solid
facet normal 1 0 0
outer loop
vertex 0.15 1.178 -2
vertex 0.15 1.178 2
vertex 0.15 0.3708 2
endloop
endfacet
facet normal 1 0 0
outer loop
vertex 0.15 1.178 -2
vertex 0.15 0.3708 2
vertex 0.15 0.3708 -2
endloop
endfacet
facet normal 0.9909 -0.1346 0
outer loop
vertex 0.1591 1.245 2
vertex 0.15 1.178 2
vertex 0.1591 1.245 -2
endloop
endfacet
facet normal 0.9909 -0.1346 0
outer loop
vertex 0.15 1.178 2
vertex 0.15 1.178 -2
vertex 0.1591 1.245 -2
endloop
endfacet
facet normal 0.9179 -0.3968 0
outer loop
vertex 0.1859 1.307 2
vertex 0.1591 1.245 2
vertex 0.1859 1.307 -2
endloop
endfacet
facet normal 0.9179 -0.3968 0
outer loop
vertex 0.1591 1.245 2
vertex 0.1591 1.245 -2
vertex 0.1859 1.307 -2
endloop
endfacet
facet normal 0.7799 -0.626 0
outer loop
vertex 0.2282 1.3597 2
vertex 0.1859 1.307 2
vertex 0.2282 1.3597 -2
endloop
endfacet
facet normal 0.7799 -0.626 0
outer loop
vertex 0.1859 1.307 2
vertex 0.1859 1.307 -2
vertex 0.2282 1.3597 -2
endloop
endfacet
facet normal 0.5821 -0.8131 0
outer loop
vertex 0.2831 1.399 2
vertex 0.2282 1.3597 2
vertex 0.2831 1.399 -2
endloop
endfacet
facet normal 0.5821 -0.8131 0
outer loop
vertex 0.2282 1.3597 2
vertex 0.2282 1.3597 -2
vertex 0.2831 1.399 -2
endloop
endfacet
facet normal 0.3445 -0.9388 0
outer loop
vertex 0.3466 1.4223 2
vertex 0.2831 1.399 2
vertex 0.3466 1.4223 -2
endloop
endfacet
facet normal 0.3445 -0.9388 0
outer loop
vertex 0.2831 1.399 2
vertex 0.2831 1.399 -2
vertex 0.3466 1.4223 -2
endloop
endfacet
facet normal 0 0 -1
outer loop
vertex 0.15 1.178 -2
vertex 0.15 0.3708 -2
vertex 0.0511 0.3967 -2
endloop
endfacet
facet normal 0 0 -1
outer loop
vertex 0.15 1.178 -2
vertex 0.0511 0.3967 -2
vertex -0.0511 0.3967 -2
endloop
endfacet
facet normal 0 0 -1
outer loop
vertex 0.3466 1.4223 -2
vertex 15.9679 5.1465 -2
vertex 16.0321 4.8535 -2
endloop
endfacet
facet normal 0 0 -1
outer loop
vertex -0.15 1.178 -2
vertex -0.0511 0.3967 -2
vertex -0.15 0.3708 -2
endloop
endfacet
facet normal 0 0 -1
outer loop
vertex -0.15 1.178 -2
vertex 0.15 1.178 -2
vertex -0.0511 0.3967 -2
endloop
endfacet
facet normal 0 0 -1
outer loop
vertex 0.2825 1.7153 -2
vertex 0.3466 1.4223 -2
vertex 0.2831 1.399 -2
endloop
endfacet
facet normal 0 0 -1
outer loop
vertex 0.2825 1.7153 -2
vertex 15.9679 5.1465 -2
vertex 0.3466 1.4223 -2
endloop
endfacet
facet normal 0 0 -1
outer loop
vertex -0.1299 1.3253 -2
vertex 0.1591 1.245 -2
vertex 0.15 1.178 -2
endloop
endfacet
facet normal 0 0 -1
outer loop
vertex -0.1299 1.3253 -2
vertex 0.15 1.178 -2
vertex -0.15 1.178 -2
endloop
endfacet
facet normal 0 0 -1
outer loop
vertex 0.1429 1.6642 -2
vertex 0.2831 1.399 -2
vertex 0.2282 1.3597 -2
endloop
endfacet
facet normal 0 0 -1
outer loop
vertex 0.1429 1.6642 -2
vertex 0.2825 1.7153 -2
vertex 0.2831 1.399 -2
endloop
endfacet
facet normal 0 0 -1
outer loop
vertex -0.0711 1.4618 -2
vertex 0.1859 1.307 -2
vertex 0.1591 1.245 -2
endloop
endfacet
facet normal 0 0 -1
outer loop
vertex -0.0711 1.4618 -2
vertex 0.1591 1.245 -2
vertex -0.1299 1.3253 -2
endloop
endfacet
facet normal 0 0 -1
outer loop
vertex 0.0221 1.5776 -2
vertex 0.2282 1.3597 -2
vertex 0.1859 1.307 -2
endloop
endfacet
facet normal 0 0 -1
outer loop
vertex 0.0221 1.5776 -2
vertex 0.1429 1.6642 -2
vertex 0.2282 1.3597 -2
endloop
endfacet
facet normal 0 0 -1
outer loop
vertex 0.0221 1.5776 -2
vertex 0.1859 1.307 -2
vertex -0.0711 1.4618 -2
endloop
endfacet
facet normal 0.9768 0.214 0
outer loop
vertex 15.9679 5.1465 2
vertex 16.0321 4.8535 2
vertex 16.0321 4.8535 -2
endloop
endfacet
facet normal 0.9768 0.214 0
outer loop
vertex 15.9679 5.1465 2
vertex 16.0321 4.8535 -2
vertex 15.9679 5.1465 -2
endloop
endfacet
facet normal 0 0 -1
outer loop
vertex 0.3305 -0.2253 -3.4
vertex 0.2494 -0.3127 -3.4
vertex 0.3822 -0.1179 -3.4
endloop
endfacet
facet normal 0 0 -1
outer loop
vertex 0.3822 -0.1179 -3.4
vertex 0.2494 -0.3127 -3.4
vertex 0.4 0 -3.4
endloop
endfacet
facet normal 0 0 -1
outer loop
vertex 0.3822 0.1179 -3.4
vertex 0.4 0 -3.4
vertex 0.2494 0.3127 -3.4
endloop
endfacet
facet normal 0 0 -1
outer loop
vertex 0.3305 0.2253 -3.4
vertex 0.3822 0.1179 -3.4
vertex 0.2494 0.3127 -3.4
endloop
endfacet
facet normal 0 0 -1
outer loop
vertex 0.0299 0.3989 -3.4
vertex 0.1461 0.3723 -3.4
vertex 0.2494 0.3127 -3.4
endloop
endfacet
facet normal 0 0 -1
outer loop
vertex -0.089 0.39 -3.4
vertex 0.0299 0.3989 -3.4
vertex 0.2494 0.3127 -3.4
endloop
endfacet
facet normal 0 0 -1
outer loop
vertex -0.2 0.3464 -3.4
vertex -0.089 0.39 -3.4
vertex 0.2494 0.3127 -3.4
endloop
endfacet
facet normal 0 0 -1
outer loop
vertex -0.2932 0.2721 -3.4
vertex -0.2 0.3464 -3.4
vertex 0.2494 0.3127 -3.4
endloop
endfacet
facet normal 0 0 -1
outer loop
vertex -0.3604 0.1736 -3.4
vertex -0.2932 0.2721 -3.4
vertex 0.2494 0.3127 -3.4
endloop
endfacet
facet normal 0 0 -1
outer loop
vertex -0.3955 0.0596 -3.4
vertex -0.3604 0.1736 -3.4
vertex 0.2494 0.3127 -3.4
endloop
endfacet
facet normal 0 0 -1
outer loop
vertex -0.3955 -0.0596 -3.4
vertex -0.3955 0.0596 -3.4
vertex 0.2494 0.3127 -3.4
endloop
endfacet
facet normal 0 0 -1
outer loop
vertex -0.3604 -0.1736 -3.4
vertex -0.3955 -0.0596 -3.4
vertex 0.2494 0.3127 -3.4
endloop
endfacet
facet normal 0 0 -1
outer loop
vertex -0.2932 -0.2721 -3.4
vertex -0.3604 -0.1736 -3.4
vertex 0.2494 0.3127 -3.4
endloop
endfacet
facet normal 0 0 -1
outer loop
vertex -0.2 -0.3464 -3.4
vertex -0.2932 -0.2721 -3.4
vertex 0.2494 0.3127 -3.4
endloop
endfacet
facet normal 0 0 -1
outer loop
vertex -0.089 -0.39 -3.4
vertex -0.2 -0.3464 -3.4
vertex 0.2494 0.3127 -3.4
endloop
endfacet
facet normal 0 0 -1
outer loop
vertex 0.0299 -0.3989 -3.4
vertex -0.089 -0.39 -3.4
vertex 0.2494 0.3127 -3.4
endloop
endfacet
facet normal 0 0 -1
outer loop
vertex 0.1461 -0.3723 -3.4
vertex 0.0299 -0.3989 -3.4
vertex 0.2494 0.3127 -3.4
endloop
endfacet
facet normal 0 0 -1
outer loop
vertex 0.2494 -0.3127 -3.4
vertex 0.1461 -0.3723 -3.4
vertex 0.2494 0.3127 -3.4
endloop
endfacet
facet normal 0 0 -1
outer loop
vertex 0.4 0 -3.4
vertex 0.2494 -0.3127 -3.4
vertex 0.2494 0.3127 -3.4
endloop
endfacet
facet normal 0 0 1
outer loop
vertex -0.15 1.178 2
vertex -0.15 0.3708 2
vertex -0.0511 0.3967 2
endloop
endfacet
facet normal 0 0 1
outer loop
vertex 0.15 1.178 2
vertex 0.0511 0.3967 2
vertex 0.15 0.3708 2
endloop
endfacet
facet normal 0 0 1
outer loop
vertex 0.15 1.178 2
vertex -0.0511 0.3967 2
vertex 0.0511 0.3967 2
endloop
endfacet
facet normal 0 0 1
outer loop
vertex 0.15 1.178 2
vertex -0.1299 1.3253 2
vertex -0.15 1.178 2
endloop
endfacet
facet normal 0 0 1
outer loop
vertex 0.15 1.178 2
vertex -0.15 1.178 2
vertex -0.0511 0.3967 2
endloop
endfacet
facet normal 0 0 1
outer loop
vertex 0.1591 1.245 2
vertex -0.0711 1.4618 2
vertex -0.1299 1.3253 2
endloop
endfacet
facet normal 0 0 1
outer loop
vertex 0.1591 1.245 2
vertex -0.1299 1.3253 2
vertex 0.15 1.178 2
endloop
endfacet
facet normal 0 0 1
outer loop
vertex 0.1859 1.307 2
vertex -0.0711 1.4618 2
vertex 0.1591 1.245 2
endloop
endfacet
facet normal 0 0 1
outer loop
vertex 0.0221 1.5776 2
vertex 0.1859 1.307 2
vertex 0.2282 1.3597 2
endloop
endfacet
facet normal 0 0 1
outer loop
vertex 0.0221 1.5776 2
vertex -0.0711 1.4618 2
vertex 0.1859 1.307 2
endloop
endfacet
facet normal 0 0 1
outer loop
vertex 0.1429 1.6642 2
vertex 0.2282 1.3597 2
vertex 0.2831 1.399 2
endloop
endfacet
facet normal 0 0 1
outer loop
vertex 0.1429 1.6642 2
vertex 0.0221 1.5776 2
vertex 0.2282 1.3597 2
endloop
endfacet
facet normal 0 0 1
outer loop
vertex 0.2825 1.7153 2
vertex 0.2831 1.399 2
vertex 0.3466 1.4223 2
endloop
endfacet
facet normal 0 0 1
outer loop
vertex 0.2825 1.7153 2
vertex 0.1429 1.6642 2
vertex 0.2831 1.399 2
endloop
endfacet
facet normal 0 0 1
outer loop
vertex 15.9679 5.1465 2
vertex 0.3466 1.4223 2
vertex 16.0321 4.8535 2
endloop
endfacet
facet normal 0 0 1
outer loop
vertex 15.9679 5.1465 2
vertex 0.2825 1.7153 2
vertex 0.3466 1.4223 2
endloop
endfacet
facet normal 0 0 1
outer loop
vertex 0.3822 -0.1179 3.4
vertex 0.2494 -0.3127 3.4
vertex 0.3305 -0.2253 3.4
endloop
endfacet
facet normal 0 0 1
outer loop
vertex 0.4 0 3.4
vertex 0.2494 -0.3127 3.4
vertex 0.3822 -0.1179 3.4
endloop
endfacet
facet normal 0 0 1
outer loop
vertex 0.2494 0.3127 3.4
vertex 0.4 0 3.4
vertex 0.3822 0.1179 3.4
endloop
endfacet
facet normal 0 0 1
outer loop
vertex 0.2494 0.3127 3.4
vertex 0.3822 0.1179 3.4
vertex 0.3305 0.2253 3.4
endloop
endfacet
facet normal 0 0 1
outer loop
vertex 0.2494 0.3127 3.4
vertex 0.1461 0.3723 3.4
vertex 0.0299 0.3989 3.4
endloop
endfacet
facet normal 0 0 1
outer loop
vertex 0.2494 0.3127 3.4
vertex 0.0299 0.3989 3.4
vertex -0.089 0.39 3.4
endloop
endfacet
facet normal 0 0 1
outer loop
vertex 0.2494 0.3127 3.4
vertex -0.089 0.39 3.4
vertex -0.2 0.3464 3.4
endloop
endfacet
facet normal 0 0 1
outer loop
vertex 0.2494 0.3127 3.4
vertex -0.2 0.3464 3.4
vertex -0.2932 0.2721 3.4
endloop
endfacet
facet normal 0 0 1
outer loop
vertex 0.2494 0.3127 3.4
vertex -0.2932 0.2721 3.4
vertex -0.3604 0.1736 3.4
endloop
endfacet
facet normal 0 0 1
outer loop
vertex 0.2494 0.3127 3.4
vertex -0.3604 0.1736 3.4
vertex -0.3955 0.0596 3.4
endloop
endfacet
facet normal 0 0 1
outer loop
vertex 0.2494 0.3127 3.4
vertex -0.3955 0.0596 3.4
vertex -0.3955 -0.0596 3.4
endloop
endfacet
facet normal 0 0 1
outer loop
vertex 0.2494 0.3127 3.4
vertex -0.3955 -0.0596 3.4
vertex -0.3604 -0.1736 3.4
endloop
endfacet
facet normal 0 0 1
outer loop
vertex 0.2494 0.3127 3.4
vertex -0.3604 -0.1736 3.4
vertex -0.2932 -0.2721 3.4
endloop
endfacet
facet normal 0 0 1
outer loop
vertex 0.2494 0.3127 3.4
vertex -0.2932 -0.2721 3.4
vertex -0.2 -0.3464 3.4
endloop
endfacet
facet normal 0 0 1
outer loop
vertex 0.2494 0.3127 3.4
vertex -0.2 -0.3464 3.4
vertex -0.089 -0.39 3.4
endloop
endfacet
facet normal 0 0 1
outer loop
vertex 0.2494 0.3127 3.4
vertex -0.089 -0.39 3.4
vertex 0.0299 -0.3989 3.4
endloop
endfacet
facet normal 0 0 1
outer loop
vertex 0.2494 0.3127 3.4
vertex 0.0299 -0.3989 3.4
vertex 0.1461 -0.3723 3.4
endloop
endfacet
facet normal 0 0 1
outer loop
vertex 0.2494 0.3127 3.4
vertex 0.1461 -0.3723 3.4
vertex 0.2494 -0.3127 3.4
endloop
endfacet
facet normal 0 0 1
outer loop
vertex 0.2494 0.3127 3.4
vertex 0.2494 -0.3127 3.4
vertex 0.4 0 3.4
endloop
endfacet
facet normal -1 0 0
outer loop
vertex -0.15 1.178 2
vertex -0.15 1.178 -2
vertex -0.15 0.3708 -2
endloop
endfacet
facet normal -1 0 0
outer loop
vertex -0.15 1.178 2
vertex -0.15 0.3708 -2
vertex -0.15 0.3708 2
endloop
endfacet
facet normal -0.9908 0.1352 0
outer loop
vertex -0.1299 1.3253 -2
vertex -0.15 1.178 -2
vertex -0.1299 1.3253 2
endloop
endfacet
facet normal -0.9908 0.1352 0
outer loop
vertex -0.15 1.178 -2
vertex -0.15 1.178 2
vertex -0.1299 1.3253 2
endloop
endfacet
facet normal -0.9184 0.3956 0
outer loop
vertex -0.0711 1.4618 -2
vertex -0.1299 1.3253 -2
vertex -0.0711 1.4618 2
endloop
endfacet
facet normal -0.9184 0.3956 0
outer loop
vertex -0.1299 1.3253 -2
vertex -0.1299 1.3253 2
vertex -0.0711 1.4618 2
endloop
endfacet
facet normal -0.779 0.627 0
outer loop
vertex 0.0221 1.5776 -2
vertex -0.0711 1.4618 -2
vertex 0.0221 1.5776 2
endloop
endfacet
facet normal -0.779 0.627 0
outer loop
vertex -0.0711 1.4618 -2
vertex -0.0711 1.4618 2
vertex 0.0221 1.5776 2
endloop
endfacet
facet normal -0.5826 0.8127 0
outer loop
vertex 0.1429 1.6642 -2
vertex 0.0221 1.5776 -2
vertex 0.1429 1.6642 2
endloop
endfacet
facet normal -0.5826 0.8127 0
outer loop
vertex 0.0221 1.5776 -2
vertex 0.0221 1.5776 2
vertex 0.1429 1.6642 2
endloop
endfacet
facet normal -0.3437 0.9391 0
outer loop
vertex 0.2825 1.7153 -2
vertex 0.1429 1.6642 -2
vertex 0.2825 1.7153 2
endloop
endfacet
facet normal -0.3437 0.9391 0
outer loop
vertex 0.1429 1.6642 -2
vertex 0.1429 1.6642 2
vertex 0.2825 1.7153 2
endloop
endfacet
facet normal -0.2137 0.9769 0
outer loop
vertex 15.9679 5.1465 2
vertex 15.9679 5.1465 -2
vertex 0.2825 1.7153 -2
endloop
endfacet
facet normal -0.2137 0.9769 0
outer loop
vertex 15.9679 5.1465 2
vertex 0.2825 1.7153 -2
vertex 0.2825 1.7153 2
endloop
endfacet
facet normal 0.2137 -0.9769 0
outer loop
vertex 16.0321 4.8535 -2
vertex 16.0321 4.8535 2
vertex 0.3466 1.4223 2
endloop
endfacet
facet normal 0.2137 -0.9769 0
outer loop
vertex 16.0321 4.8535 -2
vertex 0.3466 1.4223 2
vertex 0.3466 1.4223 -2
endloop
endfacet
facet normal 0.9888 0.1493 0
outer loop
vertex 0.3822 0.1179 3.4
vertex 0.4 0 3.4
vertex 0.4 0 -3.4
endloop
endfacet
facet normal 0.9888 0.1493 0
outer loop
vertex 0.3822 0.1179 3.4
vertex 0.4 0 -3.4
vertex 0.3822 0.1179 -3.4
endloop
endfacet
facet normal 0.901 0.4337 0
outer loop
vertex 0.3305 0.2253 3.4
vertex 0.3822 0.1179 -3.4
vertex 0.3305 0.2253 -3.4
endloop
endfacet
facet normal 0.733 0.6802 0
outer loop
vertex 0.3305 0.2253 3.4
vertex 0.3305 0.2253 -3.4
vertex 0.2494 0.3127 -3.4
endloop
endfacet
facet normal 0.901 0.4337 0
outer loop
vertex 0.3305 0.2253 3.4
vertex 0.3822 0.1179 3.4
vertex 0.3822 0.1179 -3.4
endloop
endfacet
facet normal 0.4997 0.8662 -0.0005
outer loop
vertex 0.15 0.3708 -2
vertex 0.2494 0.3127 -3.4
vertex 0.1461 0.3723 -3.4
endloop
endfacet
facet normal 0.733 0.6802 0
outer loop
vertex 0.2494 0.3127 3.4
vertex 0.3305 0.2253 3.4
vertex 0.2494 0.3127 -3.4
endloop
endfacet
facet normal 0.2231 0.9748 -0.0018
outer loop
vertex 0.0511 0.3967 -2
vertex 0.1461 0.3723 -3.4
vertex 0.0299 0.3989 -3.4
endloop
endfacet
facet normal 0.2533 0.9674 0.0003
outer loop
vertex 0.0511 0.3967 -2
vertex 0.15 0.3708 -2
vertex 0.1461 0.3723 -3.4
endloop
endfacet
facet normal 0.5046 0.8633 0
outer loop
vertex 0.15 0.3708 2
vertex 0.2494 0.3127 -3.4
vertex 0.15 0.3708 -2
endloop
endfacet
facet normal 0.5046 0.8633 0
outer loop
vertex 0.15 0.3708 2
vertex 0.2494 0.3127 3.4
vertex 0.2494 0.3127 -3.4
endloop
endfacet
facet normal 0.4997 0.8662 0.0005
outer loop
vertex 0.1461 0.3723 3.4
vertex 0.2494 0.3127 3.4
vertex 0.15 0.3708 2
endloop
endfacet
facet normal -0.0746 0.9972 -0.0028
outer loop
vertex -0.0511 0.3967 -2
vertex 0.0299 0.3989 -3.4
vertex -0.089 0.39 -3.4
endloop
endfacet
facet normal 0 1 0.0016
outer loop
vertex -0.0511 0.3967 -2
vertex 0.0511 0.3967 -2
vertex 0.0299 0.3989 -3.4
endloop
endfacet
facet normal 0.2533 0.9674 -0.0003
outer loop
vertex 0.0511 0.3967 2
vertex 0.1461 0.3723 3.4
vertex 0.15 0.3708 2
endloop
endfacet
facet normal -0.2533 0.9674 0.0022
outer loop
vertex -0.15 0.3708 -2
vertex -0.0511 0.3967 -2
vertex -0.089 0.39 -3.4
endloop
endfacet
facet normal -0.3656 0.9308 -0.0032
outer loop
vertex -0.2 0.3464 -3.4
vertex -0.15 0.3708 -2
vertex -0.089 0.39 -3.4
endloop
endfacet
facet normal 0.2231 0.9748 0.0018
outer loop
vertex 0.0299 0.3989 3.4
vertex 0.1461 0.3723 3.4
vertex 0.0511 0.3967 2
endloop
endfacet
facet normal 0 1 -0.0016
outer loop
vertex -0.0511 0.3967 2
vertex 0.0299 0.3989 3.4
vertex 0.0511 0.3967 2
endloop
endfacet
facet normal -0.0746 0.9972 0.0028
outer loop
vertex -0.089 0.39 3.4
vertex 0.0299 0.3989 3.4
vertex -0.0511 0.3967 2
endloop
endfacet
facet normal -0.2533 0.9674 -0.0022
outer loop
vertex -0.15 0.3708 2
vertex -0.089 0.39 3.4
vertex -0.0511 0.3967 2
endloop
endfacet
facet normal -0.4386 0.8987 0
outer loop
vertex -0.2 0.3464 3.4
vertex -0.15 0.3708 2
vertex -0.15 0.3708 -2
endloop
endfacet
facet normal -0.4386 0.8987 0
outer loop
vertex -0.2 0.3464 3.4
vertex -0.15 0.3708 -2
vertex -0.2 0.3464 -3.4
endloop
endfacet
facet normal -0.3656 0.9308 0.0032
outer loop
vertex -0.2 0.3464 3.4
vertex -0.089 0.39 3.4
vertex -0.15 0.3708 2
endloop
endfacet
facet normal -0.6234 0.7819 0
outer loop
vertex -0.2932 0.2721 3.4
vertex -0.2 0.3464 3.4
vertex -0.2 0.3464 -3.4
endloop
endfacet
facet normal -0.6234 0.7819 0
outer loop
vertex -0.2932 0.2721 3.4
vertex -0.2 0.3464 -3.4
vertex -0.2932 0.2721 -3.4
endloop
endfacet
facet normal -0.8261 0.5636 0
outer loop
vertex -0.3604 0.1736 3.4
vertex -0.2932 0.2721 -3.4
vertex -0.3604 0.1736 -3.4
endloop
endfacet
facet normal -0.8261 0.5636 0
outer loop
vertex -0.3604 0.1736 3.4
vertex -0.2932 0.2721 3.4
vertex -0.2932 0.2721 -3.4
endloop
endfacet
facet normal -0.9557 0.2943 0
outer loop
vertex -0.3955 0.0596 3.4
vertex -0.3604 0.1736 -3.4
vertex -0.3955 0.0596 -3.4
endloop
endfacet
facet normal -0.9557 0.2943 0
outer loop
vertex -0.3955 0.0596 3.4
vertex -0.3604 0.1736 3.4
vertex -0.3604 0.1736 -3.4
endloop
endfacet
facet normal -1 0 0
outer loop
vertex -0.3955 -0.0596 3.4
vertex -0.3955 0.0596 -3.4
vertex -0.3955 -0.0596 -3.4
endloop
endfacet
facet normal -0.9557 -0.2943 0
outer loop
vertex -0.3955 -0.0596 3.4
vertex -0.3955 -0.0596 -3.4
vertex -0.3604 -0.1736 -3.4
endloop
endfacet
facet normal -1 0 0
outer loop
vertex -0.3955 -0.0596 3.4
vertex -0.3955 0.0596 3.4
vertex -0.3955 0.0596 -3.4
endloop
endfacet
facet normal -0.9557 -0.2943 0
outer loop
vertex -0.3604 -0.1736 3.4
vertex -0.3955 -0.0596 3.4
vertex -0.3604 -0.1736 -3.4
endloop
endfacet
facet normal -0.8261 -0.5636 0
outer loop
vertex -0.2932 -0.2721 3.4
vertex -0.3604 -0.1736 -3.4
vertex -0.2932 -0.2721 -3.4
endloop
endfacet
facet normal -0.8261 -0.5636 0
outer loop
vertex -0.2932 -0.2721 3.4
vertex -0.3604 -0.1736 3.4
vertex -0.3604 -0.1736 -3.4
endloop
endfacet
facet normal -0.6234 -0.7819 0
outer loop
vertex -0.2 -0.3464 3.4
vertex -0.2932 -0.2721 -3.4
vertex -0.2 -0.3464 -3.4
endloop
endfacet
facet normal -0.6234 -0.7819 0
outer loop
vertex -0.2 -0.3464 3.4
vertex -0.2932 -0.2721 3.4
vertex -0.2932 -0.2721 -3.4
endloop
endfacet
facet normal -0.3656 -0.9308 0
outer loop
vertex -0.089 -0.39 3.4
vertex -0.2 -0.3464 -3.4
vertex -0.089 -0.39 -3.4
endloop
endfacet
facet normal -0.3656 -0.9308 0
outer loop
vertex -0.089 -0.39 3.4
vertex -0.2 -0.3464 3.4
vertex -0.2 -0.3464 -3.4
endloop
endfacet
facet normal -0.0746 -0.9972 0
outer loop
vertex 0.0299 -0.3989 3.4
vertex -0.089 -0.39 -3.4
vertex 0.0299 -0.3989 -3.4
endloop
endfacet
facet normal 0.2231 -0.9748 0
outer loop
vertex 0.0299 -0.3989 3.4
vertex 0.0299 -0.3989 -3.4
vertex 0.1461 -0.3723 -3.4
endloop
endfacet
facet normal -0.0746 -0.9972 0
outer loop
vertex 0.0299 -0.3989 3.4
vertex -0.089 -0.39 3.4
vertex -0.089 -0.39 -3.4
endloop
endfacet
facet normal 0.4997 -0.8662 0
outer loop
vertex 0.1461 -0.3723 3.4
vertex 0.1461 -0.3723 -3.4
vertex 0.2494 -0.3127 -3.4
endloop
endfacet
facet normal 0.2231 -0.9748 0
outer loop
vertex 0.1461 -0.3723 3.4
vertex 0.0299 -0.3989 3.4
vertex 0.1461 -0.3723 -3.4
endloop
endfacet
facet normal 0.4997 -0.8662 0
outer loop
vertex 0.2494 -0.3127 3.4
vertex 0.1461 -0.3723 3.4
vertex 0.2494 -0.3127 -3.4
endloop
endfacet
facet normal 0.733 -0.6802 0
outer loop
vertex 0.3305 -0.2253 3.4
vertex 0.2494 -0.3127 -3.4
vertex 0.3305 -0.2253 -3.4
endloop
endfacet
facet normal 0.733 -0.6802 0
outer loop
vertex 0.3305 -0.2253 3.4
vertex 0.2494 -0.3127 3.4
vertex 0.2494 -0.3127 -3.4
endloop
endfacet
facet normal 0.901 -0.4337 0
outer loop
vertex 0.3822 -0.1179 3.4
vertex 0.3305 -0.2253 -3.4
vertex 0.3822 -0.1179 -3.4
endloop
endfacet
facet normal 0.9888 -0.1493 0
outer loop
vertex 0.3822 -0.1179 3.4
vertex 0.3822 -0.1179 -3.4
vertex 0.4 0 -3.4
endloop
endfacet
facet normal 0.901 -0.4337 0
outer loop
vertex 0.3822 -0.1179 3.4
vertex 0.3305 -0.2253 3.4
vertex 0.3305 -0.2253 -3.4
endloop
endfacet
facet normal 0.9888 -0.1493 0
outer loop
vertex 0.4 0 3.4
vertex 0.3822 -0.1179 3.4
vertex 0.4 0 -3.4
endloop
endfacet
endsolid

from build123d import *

# Parameters (mm, degrees)
SKETCH2_W           = 0.3
SKETCH2_H           = 4
SKETCH4_R           = 0.4
BOSS_EXTRUDE1_DEPTH = 3.4


with BuildPart() as part:
    # Sweep1: sweep along a path in Sketch1
    with BuildLine(Plane.XY) as sweep1_path:
        Line((0, 0), (0, 1.178041516))
        ThreePointArc((0, 1.178041516), (0.08839809, 1.428848712), (0.314521248, 1.568801523))
        Line((0.314521248, 1.568801523), (16, 5))
    # Sketch2 → Sweep1 (sweep)
    with BuildSketch(Plane(origin=(0, 0, 0), x_dir=(1, 0, 0), z_dir=(0, 1, 0))):
        Rectangle(SKETCH2_W, SKETCH2_H)
    sweep(path=sweep1_path.line)

    # Sketch4 → Boss-Extrude1 (add, symmetric)
    with BuildSketch(Plane.XY):
        Circle(SKETCH4_R)
    extrude(amount=BOSS_EXTRUDE1_DEPTH, both=True)


solid = part.part
